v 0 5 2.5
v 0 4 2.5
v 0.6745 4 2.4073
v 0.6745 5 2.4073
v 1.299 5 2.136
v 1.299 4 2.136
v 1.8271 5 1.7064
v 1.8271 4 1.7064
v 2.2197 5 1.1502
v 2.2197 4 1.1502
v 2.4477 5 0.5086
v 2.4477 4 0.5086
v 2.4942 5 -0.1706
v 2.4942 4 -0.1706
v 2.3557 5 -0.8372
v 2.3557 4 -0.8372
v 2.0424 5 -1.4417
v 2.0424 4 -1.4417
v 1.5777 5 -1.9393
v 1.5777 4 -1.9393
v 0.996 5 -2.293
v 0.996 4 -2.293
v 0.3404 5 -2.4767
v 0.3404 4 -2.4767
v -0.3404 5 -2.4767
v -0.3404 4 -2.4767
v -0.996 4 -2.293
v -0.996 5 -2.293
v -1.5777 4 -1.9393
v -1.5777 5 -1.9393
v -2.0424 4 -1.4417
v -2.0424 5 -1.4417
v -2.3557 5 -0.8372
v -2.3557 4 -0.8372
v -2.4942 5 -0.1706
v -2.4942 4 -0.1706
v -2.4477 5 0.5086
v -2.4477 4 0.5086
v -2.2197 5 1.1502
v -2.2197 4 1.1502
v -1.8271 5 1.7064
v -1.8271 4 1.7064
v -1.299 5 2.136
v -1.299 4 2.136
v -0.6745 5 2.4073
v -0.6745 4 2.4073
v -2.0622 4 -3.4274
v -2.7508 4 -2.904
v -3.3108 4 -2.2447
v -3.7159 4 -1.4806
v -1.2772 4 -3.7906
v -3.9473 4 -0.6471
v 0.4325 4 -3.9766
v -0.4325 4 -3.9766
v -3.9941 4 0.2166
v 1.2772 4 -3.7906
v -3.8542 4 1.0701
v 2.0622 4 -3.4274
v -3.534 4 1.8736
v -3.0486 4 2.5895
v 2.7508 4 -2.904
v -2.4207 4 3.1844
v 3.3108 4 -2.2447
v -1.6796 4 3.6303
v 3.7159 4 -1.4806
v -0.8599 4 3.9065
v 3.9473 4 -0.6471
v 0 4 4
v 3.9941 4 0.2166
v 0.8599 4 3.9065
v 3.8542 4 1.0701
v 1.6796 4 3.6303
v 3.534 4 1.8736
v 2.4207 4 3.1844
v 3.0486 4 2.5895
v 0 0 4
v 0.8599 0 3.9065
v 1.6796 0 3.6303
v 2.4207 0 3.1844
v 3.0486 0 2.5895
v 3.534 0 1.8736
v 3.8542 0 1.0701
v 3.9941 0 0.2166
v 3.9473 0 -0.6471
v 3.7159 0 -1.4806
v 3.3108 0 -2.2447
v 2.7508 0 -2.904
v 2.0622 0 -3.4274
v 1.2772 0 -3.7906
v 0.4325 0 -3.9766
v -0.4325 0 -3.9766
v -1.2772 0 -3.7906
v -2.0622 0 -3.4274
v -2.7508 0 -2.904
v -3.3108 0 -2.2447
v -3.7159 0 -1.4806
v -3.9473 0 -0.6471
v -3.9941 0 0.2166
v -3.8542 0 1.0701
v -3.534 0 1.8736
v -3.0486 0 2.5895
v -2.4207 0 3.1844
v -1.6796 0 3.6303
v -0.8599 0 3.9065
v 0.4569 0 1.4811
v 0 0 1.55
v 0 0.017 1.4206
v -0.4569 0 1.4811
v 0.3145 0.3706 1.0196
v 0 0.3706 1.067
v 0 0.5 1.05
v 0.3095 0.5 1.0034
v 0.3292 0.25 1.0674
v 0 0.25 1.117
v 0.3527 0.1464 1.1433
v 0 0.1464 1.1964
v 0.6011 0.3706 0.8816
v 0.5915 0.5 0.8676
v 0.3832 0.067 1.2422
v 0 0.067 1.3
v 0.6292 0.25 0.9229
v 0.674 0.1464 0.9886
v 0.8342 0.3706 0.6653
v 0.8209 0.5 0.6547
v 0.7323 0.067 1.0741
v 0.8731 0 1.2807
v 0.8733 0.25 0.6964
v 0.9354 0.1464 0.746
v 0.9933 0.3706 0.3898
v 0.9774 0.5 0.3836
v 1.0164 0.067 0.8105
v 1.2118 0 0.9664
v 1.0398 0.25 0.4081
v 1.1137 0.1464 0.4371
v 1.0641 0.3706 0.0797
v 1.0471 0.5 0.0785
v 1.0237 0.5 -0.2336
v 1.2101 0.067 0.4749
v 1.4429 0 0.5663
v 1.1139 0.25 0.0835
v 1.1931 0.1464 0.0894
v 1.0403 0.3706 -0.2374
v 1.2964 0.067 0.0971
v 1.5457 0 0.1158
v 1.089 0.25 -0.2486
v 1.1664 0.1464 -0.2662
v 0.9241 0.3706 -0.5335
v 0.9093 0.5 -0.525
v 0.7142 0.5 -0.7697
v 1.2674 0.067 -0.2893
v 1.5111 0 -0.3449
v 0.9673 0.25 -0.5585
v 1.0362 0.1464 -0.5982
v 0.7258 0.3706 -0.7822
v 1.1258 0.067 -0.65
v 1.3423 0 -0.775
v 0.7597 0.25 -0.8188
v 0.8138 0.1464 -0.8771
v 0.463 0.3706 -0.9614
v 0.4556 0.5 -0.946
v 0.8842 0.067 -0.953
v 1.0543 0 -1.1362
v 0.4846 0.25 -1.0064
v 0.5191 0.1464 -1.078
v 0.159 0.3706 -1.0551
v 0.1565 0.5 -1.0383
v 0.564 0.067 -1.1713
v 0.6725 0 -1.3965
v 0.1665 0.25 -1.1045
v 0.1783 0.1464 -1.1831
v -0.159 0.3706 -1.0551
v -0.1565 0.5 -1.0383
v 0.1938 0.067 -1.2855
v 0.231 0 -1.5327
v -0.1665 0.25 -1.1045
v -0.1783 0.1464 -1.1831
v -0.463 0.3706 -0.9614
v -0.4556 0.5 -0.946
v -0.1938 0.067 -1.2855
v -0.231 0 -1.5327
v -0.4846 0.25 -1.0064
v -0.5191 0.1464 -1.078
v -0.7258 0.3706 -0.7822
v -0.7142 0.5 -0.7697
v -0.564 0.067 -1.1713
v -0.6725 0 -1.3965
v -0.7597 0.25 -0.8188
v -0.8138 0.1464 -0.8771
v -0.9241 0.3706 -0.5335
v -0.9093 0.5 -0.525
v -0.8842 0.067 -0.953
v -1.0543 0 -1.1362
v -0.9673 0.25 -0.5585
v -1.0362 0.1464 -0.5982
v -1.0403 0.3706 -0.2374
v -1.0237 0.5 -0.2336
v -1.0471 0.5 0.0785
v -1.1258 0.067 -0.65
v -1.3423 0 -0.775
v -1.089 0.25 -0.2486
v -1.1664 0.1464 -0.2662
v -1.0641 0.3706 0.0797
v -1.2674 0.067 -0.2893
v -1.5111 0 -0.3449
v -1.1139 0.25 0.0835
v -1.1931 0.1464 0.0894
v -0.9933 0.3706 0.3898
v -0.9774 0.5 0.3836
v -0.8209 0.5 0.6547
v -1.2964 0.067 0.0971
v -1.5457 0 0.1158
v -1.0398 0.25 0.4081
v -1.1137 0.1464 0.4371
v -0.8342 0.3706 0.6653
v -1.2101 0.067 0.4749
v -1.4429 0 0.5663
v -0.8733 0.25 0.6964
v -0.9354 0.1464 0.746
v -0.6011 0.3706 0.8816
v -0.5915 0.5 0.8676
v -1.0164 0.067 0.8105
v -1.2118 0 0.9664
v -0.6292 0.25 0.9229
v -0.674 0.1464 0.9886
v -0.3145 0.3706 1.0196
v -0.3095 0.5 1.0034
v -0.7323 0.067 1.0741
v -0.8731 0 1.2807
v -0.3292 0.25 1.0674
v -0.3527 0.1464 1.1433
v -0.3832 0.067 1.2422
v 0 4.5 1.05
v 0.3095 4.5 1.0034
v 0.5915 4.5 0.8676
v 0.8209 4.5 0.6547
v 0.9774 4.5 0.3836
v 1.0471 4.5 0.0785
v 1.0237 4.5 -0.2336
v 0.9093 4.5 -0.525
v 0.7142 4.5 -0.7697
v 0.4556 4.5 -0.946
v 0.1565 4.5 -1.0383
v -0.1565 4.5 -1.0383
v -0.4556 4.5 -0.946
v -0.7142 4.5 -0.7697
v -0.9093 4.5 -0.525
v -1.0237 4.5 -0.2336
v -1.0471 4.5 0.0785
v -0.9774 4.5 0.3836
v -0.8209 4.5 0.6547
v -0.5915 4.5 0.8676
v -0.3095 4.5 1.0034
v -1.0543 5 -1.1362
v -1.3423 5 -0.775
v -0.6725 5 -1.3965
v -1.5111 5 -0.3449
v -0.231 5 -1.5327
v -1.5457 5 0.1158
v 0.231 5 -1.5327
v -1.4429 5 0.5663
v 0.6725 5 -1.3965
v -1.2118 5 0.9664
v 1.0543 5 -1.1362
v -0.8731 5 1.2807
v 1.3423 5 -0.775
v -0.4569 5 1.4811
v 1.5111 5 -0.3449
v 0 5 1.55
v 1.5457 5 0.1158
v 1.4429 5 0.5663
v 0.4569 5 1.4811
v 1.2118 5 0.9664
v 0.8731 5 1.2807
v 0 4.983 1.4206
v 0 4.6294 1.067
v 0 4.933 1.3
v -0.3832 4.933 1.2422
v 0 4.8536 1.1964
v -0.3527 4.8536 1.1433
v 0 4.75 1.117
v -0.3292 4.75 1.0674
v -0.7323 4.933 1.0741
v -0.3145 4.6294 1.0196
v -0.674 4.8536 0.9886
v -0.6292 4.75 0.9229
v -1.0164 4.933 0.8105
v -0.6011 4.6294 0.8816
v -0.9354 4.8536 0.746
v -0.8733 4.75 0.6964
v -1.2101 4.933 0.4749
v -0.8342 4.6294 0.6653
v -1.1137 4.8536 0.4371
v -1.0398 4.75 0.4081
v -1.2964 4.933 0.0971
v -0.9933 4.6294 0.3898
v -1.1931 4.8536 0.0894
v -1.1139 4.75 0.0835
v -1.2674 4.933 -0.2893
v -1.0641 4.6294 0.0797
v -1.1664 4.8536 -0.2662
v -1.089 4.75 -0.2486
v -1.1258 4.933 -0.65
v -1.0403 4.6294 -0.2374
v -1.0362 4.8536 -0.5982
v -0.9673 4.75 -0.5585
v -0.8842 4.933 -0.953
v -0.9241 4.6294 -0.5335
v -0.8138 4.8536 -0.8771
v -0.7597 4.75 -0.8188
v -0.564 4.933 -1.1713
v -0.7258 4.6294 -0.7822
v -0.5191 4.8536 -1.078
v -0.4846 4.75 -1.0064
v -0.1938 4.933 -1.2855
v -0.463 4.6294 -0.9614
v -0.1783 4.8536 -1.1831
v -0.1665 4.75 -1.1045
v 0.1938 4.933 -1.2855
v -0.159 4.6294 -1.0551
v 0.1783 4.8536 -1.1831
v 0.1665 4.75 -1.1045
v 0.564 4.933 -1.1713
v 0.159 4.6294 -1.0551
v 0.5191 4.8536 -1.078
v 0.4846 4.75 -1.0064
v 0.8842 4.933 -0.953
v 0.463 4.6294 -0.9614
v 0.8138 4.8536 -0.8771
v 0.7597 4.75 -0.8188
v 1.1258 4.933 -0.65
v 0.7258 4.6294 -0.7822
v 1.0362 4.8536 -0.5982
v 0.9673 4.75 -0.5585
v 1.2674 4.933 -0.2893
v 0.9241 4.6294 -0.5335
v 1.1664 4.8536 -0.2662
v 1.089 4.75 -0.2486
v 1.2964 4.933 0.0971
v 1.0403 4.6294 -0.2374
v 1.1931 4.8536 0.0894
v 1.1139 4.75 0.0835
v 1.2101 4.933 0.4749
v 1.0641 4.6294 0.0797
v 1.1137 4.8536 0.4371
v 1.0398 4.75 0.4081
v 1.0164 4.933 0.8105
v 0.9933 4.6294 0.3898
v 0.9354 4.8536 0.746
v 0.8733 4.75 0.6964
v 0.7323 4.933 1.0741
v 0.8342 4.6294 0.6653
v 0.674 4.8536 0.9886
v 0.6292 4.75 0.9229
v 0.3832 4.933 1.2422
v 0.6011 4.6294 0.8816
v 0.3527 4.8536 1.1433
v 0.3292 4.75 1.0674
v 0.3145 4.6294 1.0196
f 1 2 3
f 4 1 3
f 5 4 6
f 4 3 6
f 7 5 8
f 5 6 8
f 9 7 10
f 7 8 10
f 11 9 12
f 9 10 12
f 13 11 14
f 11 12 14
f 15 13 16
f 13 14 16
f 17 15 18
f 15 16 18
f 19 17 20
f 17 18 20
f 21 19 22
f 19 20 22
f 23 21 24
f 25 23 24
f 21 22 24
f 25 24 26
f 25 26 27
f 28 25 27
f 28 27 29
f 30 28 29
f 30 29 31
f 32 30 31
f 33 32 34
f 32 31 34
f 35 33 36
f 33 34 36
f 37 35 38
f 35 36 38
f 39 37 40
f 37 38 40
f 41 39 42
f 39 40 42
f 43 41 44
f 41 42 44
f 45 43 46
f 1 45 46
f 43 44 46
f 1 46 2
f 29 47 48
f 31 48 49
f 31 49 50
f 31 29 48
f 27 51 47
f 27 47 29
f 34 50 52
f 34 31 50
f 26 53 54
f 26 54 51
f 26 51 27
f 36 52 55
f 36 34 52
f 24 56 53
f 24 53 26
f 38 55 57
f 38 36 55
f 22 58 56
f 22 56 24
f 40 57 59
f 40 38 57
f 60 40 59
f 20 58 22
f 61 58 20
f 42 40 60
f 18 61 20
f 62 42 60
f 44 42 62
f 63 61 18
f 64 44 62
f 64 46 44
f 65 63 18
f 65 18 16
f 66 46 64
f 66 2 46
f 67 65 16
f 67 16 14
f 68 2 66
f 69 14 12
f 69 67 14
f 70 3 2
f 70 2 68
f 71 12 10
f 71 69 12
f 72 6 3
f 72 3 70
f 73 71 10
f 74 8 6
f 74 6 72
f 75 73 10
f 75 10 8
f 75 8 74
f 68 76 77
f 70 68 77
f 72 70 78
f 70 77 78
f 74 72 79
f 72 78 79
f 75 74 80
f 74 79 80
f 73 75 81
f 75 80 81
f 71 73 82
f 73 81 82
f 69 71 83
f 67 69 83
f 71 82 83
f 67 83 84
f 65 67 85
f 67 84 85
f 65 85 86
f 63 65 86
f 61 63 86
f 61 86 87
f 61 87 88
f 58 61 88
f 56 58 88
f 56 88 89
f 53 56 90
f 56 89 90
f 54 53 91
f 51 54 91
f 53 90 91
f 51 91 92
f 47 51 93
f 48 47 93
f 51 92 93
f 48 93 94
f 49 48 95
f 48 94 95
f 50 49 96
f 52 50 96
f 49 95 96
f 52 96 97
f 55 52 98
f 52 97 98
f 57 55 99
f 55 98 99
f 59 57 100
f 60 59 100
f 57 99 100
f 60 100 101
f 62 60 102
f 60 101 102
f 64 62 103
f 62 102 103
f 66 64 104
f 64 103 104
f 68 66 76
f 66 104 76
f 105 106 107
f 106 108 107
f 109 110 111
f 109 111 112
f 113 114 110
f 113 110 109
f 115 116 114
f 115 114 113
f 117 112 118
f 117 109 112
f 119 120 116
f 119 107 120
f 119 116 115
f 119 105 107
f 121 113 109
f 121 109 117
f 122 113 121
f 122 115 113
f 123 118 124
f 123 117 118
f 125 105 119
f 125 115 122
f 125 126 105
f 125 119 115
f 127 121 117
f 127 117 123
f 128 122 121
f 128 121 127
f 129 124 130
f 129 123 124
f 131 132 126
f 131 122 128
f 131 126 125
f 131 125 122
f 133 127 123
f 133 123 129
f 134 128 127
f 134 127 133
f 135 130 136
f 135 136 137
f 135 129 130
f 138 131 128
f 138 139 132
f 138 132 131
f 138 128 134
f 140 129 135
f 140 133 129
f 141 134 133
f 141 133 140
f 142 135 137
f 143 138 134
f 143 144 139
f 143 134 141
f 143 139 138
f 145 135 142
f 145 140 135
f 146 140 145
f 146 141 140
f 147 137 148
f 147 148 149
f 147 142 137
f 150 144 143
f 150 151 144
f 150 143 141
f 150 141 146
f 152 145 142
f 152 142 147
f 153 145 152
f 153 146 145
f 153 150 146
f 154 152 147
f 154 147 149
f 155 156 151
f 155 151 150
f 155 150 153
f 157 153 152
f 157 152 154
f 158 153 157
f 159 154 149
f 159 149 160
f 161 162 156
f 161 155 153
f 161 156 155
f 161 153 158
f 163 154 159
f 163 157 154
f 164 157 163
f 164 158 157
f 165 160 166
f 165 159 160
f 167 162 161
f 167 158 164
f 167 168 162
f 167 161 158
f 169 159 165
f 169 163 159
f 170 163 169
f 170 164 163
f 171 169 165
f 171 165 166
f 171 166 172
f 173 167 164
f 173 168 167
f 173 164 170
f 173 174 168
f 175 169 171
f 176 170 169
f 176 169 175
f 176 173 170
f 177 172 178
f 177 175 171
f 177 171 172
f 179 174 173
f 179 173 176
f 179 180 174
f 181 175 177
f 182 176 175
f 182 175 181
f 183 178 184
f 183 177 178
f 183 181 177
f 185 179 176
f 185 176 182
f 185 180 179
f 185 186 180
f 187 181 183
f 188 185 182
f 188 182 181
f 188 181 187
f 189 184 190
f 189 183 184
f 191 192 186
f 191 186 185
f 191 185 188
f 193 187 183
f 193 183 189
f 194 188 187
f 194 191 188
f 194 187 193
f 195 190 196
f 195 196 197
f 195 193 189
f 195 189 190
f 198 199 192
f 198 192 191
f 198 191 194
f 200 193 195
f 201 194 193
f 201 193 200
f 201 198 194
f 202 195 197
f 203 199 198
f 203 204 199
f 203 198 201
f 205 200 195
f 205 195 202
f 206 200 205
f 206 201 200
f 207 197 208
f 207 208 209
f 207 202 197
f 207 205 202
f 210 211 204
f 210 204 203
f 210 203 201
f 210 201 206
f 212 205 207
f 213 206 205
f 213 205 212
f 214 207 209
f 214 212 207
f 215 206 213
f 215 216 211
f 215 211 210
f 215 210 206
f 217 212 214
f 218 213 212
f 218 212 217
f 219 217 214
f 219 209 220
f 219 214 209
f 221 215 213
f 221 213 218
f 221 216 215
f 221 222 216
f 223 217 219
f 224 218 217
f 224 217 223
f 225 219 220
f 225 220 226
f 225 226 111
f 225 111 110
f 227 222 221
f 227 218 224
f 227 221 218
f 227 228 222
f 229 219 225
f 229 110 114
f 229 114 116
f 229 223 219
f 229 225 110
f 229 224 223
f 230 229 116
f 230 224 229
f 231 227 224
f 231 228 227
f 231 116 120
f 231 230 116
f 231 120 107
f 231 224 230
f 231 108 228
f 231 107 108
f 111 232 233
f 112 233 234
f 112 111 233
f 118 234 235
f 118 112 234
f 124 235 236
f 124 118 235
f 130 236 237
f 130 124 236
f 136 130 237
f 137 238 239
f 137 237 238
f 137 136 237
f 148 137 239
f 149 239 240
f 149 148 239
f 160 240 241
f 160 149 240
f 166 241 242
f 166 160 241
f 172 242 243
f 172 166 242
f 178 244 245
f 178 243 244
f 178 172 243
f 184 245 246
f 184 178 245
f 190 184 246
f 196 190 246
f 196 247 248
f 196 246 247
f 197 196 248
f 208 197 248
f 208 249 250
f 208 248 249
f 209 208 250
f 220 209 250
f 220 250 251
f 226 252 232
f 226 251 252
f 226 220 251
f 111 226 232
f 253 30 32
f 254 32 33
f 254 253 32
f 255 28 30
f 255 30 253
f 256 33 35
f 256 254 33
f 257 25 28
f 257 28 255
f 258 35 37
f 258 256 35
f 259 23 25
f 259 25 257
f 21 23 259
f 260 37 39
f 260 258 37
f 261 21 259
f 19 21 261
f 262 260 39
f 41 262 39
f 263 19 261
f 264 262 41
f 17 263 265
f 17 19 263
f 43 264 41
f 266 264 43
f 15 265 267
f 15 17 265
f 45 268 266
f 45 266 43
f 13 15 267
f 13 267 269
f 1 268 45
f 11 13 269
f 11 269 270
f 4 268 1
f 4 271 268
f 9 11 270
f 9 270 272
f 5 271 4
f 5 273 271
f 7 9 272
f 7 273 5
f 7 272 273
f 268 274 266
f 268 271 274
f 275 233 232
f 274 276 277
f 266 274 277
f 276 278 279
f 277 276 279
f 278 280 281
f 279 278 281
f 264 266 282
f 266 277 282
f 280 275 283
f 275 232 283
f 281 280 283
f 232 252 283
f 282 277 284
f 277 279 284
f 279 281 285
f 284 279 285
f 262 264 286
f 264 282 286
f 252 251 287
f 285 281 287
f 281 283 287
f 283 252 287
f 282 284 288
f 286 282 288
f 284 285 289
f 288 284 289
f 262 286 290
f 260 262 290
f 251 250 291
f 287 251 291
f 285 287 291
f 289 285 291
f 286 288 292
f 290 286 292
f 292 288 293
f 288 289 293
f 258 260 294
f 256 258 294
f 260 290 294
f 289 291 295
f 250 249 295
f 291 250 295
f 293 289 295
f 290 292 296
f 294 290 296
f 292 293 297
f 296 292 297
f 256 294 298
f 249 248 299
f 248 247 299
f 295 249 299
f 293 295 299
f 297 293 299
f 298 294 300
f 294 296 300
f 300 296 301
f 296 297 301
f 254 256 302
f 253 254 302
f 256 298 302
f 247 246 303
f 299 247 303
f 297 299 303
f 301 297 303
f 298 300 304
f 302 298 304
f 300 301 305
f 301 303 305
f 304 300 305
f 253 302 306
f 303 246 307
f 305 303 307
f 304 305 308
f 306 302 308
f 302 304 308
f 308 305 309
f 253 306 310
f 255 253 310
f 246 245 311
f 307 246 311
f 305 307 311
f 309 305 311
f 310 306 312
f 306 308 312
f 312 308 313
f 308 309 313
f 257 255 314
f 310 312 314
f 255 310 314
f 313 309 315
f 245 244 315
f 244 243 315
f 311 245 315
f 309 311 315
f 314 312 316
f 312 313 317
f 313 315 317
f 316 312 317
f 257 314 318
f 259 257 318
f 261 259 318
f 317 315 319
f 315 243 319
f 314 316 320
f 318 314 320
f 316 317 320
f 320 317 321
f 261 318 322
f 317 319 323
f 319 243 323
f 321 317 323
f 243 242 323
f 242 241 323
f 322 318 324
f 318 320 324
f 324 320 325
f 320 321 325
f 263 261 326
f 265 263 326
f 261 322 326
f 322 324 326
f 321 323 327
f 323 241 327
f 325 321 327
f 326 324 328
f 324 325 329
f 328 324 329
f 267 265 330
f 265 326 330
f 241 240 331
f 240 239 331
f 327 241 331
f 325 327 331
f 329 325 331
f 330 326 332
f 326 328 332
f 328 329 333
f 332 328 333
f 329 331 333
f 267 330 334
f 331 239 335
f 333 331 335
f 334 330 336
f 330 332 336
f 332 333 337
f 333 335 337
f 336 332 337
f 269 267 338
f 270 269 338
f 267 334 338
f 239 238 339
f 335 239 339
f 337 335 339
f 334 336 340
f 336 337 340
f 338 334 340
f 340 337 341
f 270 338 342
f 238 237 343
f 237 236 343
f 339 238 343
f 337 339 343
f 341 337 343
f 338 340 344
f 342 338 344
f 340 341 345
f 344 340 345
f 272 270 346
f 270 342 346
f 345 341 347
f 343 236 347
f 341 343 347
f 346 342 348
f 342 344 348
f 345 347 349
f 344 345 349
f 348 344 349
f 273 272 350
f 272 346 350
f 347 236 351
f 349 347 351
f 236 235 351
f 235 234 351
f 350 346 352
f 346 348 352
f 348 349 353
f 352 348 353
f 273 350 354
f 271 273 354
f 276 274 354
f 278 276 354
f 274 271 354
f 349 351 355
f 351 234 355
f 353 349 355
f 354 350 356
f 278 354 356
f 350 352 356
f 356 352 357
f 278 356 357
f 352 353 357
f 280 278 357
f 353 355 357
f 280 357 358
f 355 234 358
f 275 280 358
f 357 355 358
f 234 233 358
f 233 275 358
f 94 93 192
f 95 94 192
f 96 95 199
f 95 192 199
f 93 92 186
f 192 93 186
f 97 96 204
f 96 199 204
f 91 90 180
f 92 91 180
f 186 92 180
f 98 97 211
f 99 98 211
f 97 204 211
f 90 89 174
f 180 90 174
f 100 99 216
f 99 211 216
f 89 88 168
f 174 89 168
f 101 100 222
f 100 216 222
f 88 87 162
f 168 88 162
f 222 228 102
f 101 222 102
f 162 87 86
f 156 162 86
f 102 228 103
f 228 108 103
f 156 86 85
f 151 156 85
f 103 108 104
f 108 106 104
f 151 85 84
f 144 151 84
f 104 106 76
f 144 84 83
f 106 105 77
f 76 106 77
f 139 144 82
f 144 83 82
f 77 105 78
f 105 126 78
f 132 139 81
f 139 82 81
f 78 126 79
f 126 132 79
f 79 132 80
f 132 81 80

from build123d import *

# Parameters (mm, degrees)
SKETCH1_R           = 4
SKETCH1_R_2         = 1.05
BOSS_EXTRUDE1_DEPTH = 4
SKETCH2_R           = 2.5
BOSS_EXTRUDE2_DEPTH = 1
SKETCH1_2_R         = 1.05
CUT_EXTRUDE1_DEPTH  = 8.549834435
FILLET1_R           = 0.5


with BuildPart() as part:
    # Sketch1 → Boss-Extrude1 (new body)
    with BuildSketch(Plane(origin=(0, 0, 0), x_dir=(1, 0, 0), z_dir=(0, 1, 0))):
        Circle(SKETCH1_R)
        Circle(SKETCH1_R_2, mode=Mode.SUBTRACT)
    extrude(amount=BOSS_EXTRUDE1_DEPTH)

    # Sketch2 → Boss-Extrude2 (add)
    with BuildSketch(Plane(origin=(0, 4, 0), x_dir=(1, 0, 0), z_dir=(0, 1, 0))):
        Circle(SKETCH2_R)
    extrude(amount=BOSS_EXTRUDE2_DEPTH)

    # Sketch1<2> → Cut-Extrude1 (cut, through all)
    with BuildSketch(Plane(origin=(0, 0, 0), x_dir=(1, 0, 0), z_dir=(0, 1, 0))):
        Circle(SKETCH1_2_R)
    extrude(amount=CUT_EXTRUDE1_DEPTH, mode=Mode.SUBTRACT)

    # Fillet1
    fillet1_edges = [part.edges().sort_by_distance(p)[0] for p in [
        (-1.05, 0, 0),
        (-1.05, 5, 0),
    ]]
    fillet(fillet1_edges, radius=FILLET1_R)


solid = part.part
